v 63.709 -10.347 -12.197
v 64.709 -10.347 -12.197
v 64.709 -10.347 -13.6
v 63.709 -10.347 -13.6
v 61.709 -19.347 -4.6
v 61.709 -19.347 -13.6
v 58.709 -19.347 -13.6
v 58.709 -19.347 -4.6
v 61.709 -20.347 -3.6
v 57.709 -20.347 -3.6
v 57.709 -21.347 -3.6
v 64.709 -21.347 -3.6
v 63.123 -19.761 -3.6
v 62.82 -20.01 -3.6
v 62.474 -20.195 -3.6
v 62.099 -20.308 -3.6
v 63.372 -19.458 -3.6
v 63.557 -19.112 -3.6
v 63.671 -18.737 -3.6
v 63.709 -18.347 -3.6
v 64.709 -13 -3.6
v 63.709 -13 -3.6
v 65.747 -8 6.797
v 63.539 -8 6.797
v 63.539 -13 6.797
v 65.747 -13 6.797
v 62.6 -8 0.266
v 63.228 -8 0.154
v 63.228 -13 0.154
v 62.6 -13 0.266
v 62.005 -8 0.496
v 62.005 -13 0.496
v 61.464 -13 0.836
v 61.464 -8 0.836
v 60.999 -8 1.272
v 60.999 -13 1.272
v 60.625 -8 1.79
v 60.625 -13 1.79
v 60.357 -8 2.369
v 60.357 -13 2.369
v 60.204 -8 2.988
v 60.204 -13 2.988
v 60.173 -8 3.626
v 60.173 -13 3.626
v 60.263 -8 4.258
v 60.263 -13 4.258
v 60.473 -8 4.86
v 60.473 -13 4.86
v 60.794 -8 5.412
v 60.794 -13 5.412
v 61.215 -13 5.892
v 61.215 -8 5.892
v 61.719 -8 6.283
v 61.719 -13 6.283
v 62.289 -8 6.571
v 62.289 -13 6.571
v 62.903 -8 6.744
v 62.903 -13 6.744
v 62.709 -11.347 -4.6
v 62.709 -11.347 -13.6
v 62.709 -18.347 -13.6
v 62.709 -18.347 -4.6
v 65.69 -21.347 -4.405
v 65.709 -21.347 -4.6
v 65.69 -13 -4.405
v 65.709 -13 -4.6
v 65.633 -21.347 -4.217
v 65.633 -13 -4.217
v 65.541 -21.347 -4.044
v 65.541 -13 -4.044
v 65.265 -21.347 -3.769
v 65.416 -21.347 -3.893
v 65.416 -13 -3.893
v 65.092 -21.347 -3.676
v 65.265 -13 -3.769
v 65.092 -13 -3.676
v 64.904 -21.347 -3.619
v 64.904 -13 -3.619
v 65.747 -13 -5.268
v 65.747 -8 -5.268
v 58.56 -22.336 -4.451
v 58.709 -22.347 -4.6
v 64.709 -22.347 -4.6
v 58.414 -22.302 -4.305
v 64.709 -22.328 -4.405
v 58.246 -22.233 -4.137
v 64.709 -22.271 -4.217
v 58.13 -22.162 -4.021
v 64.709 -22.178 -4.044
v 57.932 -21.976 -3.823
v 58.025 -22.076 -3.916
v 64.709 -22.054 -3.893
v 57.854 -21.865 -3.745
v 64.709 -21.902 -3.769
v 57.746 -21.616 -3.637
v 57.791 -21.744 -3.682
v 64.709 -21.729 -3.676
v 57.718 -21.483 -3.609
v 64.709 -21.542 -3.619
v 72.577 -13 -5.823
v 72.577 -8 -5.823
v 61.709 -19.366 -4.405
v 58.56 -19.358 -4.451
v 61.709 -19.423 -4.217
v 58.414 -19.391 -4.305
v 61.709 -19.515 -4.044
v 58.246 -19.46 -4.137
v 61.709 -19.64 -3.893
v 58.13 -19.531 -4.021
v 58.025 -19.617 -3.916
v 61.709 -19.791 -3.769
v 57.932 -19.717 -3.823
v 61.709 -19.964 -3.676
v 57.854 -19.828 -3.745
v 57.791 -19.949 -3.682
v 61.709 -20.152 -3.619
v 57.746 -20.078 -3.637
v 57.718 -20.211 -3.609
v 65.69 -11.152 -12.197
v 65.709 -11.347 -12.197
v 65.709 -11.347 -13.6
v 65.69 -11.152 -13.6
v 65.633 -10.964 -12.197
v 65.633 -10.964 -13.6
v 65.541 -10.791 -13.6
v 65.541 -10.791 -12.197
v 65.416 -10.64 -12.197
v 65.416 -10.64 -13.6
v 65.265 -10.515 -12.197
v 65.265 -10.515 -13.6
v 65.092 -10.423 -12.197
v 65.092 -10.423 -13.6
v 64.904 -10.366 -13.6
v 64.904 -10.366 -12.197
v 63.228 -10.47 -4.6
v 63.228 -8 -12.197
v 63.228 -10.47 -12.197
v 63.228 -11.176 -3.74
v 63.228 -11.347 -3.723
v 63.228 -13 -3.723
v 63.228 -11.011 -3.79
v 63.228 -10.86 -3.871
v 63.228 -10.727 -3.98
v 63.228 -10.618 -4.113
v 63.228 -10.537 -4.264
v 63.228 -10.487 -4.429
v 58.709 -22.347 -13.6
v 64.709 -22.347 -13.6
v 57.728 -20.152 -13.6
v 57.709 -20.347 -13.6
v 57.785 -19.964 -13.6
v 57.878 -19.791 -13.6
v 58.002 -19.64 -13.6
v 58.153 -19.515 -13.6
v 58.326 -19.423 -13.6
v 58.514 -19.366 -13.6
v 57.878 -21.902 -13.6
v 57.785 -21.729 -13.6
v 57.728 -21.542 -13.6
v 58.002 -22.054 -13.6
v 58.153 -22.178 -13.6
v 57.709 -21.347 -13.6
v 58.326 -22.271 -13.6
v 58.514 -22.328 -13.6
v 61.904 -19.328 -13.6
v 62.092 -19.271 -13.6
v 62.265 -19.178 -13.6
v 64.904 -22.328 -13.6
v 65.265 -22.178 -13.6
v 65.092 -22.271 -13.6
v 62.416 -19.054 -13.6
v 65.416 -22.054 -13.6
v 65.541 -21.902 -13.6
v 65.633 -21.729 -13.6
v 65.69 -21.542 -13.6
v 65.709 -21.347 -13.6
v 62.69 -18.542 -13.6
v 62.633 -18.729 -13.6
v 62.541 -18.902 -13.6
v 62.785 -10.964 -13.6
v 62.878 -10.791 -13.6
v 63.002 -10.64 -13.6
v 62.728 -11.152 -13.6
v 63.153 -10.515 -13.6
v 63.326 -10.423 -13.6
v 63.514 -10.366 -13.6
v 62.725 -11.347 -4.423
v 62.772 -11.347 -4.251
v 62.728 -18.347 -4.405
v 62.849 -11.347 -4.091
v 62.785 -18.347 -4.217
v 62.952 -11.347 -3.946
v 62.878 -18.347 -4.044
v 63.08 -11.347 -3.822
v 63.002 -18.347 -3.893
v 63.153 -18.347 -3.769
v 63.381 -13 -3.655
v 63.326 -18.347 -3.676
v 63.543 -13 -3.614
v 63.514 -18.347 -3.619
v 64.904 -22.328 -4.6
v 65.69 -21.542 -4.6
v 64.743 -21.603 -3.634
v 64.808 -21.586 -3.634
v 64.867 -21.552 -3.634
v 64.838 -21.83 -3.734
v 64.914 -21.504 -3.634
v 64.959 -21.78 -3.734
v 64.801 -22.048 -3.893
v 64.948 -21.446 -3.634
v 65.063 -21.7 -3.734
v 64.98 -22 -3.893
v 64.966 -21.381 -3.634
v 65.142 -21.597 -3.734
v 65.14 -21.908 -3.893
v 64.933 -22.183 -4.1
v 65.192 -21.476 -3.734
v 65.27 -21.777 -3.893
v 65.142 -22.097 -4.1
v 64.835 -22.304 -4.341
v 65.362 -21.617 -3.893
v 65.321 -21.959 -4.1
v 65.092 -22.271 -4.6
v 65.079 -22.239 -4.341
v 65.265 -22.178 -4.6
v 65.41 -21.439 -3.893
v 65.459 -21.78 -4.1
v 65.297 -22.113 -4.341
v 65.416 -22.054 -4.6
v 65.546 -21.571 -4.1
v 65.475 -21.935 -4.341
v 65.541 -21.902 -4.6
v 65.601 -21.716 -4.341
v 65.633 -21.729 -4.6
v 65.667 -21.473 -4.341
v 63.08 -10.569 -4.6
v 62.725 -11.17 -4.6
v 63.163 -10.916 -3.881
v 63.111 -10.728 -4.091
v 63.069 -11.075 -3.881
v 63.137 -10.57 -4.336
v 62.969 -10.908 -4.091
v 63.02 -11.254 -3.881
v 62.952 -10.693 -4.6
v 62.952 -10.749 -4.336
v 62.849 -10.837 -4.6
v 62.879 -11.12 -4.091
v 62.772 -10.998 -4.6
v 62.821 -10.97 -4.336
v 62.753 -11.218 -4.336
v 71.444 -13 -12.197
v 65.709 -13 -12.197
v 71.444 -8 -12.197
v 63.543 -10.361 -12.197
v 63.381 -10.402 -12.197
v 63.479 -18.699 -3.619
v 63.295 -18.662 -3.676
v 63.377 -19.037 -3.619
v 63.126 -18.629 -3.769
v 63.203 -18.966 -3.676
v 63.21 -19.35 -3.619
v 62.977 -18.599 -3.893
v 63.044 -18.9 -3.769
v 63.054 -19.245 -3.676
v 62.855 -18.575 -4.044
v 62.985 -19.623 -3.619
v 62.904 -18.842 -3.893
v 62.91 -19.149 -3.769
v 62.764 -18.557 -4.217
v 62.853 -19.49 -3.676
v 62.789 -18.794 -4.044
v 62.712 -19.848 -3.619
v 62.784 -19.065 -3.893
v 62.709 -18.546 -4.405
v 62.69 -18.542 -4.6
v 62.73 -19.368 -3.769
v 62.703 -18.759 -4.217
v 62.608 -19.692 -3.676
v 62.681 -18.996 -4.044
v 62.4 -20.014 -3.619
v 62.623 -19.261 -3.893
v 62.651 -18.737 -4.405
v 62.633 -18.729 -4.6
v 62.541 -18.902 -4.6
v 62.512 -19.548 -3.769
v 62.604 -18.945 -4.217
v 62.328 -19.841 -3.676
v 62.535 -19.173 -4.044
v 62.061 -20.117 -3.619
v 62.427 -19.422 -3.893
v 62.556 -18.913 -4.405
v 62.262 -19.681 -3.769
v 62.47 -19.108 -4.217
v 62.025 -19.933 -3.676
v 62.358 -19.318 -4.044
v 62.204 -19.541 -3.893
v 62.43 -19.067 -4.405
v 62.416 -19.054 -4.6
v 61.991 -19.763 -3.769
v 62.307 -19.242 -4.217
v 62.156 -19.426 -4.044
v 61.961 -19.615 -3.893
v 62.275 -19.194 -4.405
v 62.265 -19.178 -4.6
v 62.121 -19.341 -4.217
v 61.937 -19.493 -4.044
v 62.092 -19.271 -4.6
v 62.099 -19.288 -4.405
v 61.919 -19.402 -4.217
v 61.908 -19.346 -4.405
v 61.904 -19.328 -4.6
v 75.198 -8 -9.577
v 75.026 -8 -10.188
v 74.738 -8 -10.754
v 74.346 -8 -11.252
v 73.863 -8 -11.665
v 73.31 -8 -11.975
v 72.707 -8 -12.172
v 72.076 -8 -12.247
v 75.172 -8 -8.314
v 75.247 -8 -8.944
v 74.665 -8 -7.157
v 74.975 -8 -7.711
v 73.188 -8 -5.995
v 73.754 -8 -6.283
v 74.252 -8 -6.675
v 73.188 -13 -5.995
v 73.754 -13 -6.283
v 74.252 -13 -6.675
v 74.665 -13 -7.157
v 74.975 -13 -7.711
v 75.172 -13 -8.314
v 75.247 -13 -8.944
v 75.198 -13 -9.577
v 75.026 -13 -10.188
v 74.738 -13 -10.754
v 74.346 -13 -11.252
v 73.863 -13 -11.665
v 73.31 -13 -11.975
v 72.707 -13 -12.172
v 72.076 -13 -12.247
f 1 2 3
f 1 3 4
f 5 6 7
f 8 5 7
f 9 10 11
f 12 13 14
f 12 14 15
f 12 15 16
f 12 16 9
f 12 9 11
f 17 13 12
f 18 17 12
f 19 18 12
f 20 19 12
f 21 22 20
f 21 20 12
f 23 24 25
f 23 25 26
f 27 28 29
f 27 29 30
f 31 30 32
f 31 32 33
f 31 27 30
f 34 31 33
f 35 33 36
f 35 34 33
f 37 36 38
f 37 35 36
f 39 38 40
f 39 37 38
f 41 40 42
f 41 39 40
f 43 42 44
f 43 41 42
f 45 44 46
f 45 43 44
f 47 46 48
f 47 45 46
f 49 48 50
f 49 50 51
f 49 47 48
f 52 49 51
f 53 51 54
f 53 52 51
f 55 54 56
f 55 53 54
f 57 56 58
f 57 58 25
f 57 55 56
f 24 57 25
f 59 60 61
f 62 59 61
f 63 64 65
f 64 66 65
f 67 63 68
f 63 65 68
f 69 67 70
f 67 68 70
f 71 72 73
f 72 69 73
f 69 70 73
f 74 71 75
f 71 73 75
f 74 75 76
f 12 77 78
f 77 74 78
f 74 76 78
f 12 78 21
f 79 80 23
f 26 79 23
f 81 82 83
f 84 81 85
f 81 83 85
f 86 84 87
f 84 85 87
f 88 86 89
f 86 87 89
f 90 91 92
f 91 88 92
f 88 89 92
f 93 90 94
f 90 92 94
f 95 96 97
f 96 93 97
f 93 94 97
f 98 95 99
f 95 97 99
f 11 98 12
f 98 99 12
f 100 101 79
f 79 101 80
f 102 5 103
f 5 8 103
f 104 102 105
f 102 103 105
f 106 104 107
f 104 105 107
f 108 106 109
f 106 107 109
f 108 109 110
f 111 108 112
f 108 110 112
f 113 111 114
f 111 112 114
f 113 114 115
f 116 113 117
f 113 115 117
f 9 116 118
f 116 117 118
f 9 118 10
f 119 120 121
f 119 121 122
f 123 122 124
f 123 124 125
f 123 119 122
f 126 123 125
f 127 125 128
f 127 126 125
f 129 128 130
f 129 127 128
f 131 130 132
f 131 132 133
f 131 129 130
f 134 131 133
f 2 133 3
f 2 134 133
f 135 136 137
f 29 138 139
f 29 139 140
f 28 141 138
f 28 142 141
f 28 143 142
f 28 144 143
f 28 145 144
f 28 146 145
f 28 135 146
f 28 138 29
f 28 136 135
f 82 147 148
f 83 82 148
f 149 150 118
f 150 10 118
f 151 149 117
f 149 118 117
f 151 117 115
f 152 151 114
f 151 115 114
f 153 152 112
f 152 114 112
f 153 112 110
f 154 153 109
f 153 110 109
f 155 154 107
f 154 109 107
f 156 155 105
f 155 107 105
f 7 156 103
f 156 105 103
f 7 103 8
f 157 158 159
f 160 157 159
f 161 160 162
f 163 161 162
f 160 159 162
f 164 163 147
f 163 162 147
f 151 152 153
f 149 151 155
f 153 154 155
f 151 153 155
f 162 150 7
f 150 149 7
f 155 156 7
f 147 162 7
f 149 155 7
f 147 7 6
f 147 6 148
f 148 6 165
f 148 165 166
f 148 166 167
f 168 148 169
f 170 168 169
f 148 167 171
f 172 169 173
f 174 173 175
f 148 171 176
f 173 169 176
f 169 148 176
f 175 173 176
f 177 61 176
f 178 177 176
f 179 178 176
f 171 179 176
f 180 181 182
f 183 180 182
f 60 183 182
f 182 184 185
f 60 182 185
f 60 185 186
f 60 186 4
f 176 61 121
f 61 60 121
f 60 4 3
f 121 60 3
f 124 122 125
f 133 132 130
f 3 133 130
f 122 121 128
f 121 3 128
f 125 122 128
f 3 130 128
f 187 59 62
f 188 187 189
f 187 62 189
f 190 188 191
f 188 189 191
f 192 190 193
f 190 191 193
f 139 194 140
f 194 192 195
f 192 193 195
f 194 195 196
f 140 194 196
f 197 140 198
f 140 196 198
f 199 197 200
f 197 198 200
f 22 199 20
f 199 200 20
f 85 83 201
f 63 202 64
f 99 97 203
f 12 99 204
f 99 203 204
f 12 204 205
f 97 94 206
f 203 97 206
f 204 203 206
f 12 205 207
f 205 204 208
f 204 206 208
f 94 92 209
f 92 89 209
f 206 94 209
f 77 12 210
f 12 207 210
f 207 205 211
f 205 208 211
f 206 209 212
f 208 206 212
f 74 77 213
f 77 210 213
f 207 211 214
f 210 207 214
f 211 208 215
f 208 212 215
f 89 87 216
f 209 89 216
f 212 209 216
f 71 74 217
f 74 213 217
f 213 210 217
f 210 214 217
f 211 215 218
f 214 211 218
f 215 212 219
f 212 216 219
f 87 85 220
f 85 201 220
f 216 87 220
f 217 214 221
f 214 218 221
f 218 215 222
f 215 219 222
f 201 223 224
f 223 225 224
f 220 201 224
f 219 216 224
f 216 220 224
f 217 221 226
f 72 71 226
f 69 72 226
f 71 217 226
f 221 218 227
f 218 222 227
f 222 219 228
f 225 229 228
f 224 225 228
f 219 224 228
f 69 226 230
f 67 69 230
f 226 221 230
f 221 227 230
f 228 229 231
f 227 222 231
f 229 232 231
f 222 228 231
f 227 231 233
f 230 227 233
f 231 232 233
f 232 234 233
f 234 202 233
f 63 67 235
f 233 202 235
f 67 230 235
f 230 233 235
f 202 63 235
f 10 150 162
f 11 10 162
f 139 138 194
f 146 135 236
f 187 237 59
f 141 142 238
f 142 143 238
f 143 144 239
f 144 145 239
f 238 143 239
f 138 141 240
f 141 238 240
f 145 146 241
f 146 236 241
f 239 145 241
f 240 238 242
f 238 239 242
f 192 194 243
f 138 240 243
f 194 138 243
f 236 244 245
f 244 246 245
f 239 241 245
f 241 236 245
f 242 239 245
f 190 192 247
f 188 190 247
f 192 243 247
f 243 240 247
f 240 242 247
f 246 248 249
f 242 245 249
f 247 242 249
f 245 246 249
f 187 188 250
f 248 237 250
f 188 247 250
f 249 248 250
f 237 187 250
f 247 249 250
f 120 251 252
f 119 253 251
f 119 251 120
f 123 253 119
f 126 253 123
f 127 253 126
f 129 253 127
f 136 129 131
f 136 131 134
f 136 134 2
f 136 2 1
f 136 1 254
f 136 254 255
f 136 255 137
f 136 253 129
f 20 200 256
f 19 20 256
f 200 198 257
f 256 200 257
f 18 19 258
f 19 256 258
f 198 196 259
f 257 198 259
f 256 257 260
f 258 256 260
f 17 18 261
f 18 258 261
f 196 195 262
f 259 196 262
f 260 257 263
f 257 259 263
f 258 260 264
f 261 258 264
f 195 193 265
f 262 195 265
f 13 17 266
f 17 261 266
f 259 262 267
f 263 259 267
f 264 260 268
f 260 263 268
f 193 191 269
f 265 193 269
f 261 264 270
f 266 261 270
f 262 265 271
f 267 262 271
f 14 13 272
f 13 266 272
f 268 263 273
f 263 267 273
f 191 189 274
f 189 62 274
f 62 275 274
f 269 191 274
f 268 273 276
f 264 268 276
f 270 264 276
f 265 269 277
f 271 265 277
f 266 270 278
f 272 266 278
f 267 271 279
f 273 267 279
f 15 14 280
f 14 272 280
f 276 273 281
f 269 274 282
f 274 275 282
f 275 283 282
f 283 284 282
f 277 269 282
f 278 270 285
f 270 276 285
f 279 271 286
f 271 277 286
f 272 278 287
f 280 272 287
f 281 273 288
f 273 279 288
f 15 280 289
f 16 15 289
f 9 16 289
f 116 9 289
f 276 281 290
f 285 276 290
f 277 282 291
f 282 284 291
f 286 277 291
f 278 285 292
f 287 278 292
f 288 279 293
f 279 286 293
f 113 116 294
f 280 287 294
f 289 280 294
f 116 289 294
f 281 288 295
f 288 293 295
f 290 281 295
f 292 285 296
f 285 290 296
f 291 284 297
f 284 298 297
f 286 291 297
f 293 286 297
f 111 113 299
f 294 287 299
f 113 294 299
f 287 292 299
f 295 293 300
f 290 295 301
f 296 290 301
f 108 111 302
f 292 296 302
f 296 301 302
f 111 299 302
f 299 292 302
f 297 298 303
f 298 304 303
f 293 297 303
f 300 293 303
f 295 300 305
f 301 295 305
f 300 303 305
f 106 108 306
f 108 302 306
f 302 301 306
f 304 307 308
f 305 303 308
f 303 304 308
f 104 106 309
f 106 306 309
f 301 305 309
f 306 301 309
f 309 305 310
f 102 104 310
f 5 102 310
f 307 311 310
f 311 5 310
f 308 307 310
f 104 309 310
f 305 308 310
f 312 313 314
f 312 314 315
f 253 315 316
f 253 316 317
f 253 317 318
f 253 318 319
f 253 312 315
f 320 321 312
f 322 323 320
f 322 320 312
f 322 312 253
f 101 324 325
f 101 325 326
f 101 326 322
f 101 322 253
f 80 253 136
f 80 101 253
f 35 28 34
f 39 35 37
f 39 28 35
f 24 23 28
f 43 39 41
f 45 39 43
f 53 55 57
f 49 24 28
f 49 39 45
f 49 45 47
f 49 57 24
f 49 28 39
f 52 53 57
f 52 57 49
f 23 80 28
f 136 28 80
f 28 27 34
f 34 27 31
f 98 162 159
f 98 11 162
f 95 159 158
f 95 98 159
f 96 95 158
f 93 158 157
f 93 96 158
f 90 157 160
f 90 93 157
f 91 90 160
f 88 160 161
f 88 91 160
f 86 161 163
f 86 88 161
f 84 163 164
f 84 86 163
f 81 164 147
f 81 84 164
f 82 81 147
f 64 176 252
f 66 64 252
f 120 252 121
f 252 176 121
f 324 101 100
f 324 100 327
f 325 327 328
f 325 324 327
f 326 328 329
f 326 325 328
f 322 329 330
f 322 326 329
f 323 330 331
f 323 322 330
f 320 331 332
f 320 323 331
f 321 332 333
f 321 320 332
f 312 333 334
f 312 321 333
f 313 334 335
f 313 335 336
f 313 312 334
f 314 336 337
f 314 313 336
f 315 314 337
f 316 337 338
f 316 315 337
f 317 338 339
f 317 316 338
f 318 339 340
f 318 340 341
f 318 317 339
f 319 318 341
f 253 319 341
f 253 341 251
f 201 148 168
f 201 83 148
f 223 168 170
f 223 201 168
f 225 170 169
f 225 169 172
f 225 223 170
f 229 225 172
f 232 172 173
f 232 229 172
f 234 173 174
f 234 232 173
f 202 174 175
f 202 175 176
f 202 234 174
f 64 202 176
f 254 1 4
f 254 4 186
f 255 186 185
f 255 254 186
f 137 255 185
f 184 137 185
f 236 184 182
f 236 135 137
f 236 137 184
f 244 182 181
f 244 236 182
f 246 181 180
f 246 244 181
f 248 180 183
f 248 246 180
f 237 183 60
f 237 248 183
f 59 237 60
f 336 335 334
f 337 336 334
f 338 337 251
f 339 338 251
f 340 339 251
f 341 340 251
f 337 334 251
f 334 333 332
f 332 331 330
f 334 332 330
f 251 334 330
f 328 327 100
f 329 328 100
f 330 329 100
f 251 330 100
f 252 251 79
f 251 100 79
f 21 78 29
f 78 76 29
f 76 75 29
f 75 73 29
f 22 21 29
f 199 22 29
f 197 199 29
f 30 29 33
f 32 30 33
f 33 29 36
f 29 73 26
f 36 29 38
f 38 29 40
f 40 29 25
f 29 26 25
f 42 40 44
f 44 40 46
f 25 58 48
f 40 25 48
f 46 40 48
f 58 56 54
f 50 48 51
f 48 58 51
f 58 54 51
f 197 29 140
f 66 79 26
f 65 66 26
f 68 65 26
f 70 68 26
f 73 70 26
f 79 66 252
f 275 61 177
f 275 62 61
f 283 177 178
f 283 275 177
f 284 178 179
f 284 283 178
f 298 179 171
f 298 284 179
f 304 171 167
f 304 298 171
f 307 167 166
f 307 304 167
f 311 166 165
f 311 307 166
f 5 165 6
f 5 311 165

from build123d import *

# Parameters (mm, degrees)
EXTRUDE003_DEPTH                  = 10
FILLET021_R                       = 1
EXTRUDE004_DEPTH                  = 5
PART_MIRRORING006_PLACEMENT_ANGLE = 180


with BuildPart() as fillet021:
    # Sketch005 → Extrude003 (new body)
    with BuildSketch(Plane.XY):
        Polygon((57.709053, -19.346786), (57.709053, -22.346786), (65.709053, -22.346786), (65.709053, -10.346786), (62.709053, -10.346786), (62.709053, -19.346786), align=None)
    extrude(amount=EXTRUDE003_DEPTH)


with BuildPart() as fillet021_1:
    # Extrude003 placement: moved
    add(fillet021.part.moved(Location((0, 0, -14))))

    # Fillet021
    fillet021_edges = [fillet021_1.edges().sort_by_distance(p)[0] for p in [
        (57.709053, -19.346786, -9),
        (57.709053, -22.346786, -9),
        (65.709053, -22.346786, -9),
        (61.709053, -22.346786, -4),
        (65.709053, -10.346786, -9),
        (65.709053, -16.346786, -4),
        (62.709053, -10.346786, -9),
        (64.209053, -10.346786, -4),
        (62.709053, -19.346786, -9),
        (62.709053, -14.846786, -4),
        (60.209053, -19.346786, -4),
    ]]
    fillet(fillet021_edges, radius=FILLET021_R)


with BuildPart() as fillet021_2:
    # Fillet021 placement: moved
    add(fillet021_1.part.moved(Location((0, 0, 0.4))))


with BuildPart() as extrude004:
    # Sketch006 → Extrude004 (new body)
    with BuildSketch(Plane.XZ):
        with BuildLine():
            ThreePointArc((14.771842, 0.154152), (17.827348, 3.62591), (14.461083, 6.797264))
            Line((14.461083, 6.797264), (12.252875, 6.797264))
            Line((12.252875, -5.267611), (12.252875, 6.797264))
            Line((5.422805, -5.82309), (12.252875, -5.267611))
            ThreePointArc((5.422805, -5.82309), (2.802341, -9.576998), (6.556249, -12.197462))
            Line((6.556249, -12.197462), (14.771842, -12.197462))
            Line((14.771842, -12.197462), (14.771842, 0.154152))
        make_face()
    extrude(amount=EXTRUDE004_DEPTH)


with BuildPart() as extrude004_1:
    # Extrude004 placement: moved
    add(extrude004.part.moved(Location((0, -8, 0))))


with BuildPart() as c4holds003:
    # Part__Mirroring006: instance of Extrude004
    add(extrude004_1.part.mirror(Plane(origin=(0, 0, 0), x_dir=(0, 1, 0), z_dir=(0, 0, 1))))


with BuildPart() as c4holds003_1:
    # Part__Mirroring006 placement: moved
    add(c4holds003.part.moved(Location((78, 0, 0))).rotate(Axis((78, 0, 0), (0, 1, 0)), PART_MIRRORING006_PLACEMENT_ANGLE))

    # Fusion041: union Fillet021
    add(fillet021_2.part)


solid = c4holds003_1.part
